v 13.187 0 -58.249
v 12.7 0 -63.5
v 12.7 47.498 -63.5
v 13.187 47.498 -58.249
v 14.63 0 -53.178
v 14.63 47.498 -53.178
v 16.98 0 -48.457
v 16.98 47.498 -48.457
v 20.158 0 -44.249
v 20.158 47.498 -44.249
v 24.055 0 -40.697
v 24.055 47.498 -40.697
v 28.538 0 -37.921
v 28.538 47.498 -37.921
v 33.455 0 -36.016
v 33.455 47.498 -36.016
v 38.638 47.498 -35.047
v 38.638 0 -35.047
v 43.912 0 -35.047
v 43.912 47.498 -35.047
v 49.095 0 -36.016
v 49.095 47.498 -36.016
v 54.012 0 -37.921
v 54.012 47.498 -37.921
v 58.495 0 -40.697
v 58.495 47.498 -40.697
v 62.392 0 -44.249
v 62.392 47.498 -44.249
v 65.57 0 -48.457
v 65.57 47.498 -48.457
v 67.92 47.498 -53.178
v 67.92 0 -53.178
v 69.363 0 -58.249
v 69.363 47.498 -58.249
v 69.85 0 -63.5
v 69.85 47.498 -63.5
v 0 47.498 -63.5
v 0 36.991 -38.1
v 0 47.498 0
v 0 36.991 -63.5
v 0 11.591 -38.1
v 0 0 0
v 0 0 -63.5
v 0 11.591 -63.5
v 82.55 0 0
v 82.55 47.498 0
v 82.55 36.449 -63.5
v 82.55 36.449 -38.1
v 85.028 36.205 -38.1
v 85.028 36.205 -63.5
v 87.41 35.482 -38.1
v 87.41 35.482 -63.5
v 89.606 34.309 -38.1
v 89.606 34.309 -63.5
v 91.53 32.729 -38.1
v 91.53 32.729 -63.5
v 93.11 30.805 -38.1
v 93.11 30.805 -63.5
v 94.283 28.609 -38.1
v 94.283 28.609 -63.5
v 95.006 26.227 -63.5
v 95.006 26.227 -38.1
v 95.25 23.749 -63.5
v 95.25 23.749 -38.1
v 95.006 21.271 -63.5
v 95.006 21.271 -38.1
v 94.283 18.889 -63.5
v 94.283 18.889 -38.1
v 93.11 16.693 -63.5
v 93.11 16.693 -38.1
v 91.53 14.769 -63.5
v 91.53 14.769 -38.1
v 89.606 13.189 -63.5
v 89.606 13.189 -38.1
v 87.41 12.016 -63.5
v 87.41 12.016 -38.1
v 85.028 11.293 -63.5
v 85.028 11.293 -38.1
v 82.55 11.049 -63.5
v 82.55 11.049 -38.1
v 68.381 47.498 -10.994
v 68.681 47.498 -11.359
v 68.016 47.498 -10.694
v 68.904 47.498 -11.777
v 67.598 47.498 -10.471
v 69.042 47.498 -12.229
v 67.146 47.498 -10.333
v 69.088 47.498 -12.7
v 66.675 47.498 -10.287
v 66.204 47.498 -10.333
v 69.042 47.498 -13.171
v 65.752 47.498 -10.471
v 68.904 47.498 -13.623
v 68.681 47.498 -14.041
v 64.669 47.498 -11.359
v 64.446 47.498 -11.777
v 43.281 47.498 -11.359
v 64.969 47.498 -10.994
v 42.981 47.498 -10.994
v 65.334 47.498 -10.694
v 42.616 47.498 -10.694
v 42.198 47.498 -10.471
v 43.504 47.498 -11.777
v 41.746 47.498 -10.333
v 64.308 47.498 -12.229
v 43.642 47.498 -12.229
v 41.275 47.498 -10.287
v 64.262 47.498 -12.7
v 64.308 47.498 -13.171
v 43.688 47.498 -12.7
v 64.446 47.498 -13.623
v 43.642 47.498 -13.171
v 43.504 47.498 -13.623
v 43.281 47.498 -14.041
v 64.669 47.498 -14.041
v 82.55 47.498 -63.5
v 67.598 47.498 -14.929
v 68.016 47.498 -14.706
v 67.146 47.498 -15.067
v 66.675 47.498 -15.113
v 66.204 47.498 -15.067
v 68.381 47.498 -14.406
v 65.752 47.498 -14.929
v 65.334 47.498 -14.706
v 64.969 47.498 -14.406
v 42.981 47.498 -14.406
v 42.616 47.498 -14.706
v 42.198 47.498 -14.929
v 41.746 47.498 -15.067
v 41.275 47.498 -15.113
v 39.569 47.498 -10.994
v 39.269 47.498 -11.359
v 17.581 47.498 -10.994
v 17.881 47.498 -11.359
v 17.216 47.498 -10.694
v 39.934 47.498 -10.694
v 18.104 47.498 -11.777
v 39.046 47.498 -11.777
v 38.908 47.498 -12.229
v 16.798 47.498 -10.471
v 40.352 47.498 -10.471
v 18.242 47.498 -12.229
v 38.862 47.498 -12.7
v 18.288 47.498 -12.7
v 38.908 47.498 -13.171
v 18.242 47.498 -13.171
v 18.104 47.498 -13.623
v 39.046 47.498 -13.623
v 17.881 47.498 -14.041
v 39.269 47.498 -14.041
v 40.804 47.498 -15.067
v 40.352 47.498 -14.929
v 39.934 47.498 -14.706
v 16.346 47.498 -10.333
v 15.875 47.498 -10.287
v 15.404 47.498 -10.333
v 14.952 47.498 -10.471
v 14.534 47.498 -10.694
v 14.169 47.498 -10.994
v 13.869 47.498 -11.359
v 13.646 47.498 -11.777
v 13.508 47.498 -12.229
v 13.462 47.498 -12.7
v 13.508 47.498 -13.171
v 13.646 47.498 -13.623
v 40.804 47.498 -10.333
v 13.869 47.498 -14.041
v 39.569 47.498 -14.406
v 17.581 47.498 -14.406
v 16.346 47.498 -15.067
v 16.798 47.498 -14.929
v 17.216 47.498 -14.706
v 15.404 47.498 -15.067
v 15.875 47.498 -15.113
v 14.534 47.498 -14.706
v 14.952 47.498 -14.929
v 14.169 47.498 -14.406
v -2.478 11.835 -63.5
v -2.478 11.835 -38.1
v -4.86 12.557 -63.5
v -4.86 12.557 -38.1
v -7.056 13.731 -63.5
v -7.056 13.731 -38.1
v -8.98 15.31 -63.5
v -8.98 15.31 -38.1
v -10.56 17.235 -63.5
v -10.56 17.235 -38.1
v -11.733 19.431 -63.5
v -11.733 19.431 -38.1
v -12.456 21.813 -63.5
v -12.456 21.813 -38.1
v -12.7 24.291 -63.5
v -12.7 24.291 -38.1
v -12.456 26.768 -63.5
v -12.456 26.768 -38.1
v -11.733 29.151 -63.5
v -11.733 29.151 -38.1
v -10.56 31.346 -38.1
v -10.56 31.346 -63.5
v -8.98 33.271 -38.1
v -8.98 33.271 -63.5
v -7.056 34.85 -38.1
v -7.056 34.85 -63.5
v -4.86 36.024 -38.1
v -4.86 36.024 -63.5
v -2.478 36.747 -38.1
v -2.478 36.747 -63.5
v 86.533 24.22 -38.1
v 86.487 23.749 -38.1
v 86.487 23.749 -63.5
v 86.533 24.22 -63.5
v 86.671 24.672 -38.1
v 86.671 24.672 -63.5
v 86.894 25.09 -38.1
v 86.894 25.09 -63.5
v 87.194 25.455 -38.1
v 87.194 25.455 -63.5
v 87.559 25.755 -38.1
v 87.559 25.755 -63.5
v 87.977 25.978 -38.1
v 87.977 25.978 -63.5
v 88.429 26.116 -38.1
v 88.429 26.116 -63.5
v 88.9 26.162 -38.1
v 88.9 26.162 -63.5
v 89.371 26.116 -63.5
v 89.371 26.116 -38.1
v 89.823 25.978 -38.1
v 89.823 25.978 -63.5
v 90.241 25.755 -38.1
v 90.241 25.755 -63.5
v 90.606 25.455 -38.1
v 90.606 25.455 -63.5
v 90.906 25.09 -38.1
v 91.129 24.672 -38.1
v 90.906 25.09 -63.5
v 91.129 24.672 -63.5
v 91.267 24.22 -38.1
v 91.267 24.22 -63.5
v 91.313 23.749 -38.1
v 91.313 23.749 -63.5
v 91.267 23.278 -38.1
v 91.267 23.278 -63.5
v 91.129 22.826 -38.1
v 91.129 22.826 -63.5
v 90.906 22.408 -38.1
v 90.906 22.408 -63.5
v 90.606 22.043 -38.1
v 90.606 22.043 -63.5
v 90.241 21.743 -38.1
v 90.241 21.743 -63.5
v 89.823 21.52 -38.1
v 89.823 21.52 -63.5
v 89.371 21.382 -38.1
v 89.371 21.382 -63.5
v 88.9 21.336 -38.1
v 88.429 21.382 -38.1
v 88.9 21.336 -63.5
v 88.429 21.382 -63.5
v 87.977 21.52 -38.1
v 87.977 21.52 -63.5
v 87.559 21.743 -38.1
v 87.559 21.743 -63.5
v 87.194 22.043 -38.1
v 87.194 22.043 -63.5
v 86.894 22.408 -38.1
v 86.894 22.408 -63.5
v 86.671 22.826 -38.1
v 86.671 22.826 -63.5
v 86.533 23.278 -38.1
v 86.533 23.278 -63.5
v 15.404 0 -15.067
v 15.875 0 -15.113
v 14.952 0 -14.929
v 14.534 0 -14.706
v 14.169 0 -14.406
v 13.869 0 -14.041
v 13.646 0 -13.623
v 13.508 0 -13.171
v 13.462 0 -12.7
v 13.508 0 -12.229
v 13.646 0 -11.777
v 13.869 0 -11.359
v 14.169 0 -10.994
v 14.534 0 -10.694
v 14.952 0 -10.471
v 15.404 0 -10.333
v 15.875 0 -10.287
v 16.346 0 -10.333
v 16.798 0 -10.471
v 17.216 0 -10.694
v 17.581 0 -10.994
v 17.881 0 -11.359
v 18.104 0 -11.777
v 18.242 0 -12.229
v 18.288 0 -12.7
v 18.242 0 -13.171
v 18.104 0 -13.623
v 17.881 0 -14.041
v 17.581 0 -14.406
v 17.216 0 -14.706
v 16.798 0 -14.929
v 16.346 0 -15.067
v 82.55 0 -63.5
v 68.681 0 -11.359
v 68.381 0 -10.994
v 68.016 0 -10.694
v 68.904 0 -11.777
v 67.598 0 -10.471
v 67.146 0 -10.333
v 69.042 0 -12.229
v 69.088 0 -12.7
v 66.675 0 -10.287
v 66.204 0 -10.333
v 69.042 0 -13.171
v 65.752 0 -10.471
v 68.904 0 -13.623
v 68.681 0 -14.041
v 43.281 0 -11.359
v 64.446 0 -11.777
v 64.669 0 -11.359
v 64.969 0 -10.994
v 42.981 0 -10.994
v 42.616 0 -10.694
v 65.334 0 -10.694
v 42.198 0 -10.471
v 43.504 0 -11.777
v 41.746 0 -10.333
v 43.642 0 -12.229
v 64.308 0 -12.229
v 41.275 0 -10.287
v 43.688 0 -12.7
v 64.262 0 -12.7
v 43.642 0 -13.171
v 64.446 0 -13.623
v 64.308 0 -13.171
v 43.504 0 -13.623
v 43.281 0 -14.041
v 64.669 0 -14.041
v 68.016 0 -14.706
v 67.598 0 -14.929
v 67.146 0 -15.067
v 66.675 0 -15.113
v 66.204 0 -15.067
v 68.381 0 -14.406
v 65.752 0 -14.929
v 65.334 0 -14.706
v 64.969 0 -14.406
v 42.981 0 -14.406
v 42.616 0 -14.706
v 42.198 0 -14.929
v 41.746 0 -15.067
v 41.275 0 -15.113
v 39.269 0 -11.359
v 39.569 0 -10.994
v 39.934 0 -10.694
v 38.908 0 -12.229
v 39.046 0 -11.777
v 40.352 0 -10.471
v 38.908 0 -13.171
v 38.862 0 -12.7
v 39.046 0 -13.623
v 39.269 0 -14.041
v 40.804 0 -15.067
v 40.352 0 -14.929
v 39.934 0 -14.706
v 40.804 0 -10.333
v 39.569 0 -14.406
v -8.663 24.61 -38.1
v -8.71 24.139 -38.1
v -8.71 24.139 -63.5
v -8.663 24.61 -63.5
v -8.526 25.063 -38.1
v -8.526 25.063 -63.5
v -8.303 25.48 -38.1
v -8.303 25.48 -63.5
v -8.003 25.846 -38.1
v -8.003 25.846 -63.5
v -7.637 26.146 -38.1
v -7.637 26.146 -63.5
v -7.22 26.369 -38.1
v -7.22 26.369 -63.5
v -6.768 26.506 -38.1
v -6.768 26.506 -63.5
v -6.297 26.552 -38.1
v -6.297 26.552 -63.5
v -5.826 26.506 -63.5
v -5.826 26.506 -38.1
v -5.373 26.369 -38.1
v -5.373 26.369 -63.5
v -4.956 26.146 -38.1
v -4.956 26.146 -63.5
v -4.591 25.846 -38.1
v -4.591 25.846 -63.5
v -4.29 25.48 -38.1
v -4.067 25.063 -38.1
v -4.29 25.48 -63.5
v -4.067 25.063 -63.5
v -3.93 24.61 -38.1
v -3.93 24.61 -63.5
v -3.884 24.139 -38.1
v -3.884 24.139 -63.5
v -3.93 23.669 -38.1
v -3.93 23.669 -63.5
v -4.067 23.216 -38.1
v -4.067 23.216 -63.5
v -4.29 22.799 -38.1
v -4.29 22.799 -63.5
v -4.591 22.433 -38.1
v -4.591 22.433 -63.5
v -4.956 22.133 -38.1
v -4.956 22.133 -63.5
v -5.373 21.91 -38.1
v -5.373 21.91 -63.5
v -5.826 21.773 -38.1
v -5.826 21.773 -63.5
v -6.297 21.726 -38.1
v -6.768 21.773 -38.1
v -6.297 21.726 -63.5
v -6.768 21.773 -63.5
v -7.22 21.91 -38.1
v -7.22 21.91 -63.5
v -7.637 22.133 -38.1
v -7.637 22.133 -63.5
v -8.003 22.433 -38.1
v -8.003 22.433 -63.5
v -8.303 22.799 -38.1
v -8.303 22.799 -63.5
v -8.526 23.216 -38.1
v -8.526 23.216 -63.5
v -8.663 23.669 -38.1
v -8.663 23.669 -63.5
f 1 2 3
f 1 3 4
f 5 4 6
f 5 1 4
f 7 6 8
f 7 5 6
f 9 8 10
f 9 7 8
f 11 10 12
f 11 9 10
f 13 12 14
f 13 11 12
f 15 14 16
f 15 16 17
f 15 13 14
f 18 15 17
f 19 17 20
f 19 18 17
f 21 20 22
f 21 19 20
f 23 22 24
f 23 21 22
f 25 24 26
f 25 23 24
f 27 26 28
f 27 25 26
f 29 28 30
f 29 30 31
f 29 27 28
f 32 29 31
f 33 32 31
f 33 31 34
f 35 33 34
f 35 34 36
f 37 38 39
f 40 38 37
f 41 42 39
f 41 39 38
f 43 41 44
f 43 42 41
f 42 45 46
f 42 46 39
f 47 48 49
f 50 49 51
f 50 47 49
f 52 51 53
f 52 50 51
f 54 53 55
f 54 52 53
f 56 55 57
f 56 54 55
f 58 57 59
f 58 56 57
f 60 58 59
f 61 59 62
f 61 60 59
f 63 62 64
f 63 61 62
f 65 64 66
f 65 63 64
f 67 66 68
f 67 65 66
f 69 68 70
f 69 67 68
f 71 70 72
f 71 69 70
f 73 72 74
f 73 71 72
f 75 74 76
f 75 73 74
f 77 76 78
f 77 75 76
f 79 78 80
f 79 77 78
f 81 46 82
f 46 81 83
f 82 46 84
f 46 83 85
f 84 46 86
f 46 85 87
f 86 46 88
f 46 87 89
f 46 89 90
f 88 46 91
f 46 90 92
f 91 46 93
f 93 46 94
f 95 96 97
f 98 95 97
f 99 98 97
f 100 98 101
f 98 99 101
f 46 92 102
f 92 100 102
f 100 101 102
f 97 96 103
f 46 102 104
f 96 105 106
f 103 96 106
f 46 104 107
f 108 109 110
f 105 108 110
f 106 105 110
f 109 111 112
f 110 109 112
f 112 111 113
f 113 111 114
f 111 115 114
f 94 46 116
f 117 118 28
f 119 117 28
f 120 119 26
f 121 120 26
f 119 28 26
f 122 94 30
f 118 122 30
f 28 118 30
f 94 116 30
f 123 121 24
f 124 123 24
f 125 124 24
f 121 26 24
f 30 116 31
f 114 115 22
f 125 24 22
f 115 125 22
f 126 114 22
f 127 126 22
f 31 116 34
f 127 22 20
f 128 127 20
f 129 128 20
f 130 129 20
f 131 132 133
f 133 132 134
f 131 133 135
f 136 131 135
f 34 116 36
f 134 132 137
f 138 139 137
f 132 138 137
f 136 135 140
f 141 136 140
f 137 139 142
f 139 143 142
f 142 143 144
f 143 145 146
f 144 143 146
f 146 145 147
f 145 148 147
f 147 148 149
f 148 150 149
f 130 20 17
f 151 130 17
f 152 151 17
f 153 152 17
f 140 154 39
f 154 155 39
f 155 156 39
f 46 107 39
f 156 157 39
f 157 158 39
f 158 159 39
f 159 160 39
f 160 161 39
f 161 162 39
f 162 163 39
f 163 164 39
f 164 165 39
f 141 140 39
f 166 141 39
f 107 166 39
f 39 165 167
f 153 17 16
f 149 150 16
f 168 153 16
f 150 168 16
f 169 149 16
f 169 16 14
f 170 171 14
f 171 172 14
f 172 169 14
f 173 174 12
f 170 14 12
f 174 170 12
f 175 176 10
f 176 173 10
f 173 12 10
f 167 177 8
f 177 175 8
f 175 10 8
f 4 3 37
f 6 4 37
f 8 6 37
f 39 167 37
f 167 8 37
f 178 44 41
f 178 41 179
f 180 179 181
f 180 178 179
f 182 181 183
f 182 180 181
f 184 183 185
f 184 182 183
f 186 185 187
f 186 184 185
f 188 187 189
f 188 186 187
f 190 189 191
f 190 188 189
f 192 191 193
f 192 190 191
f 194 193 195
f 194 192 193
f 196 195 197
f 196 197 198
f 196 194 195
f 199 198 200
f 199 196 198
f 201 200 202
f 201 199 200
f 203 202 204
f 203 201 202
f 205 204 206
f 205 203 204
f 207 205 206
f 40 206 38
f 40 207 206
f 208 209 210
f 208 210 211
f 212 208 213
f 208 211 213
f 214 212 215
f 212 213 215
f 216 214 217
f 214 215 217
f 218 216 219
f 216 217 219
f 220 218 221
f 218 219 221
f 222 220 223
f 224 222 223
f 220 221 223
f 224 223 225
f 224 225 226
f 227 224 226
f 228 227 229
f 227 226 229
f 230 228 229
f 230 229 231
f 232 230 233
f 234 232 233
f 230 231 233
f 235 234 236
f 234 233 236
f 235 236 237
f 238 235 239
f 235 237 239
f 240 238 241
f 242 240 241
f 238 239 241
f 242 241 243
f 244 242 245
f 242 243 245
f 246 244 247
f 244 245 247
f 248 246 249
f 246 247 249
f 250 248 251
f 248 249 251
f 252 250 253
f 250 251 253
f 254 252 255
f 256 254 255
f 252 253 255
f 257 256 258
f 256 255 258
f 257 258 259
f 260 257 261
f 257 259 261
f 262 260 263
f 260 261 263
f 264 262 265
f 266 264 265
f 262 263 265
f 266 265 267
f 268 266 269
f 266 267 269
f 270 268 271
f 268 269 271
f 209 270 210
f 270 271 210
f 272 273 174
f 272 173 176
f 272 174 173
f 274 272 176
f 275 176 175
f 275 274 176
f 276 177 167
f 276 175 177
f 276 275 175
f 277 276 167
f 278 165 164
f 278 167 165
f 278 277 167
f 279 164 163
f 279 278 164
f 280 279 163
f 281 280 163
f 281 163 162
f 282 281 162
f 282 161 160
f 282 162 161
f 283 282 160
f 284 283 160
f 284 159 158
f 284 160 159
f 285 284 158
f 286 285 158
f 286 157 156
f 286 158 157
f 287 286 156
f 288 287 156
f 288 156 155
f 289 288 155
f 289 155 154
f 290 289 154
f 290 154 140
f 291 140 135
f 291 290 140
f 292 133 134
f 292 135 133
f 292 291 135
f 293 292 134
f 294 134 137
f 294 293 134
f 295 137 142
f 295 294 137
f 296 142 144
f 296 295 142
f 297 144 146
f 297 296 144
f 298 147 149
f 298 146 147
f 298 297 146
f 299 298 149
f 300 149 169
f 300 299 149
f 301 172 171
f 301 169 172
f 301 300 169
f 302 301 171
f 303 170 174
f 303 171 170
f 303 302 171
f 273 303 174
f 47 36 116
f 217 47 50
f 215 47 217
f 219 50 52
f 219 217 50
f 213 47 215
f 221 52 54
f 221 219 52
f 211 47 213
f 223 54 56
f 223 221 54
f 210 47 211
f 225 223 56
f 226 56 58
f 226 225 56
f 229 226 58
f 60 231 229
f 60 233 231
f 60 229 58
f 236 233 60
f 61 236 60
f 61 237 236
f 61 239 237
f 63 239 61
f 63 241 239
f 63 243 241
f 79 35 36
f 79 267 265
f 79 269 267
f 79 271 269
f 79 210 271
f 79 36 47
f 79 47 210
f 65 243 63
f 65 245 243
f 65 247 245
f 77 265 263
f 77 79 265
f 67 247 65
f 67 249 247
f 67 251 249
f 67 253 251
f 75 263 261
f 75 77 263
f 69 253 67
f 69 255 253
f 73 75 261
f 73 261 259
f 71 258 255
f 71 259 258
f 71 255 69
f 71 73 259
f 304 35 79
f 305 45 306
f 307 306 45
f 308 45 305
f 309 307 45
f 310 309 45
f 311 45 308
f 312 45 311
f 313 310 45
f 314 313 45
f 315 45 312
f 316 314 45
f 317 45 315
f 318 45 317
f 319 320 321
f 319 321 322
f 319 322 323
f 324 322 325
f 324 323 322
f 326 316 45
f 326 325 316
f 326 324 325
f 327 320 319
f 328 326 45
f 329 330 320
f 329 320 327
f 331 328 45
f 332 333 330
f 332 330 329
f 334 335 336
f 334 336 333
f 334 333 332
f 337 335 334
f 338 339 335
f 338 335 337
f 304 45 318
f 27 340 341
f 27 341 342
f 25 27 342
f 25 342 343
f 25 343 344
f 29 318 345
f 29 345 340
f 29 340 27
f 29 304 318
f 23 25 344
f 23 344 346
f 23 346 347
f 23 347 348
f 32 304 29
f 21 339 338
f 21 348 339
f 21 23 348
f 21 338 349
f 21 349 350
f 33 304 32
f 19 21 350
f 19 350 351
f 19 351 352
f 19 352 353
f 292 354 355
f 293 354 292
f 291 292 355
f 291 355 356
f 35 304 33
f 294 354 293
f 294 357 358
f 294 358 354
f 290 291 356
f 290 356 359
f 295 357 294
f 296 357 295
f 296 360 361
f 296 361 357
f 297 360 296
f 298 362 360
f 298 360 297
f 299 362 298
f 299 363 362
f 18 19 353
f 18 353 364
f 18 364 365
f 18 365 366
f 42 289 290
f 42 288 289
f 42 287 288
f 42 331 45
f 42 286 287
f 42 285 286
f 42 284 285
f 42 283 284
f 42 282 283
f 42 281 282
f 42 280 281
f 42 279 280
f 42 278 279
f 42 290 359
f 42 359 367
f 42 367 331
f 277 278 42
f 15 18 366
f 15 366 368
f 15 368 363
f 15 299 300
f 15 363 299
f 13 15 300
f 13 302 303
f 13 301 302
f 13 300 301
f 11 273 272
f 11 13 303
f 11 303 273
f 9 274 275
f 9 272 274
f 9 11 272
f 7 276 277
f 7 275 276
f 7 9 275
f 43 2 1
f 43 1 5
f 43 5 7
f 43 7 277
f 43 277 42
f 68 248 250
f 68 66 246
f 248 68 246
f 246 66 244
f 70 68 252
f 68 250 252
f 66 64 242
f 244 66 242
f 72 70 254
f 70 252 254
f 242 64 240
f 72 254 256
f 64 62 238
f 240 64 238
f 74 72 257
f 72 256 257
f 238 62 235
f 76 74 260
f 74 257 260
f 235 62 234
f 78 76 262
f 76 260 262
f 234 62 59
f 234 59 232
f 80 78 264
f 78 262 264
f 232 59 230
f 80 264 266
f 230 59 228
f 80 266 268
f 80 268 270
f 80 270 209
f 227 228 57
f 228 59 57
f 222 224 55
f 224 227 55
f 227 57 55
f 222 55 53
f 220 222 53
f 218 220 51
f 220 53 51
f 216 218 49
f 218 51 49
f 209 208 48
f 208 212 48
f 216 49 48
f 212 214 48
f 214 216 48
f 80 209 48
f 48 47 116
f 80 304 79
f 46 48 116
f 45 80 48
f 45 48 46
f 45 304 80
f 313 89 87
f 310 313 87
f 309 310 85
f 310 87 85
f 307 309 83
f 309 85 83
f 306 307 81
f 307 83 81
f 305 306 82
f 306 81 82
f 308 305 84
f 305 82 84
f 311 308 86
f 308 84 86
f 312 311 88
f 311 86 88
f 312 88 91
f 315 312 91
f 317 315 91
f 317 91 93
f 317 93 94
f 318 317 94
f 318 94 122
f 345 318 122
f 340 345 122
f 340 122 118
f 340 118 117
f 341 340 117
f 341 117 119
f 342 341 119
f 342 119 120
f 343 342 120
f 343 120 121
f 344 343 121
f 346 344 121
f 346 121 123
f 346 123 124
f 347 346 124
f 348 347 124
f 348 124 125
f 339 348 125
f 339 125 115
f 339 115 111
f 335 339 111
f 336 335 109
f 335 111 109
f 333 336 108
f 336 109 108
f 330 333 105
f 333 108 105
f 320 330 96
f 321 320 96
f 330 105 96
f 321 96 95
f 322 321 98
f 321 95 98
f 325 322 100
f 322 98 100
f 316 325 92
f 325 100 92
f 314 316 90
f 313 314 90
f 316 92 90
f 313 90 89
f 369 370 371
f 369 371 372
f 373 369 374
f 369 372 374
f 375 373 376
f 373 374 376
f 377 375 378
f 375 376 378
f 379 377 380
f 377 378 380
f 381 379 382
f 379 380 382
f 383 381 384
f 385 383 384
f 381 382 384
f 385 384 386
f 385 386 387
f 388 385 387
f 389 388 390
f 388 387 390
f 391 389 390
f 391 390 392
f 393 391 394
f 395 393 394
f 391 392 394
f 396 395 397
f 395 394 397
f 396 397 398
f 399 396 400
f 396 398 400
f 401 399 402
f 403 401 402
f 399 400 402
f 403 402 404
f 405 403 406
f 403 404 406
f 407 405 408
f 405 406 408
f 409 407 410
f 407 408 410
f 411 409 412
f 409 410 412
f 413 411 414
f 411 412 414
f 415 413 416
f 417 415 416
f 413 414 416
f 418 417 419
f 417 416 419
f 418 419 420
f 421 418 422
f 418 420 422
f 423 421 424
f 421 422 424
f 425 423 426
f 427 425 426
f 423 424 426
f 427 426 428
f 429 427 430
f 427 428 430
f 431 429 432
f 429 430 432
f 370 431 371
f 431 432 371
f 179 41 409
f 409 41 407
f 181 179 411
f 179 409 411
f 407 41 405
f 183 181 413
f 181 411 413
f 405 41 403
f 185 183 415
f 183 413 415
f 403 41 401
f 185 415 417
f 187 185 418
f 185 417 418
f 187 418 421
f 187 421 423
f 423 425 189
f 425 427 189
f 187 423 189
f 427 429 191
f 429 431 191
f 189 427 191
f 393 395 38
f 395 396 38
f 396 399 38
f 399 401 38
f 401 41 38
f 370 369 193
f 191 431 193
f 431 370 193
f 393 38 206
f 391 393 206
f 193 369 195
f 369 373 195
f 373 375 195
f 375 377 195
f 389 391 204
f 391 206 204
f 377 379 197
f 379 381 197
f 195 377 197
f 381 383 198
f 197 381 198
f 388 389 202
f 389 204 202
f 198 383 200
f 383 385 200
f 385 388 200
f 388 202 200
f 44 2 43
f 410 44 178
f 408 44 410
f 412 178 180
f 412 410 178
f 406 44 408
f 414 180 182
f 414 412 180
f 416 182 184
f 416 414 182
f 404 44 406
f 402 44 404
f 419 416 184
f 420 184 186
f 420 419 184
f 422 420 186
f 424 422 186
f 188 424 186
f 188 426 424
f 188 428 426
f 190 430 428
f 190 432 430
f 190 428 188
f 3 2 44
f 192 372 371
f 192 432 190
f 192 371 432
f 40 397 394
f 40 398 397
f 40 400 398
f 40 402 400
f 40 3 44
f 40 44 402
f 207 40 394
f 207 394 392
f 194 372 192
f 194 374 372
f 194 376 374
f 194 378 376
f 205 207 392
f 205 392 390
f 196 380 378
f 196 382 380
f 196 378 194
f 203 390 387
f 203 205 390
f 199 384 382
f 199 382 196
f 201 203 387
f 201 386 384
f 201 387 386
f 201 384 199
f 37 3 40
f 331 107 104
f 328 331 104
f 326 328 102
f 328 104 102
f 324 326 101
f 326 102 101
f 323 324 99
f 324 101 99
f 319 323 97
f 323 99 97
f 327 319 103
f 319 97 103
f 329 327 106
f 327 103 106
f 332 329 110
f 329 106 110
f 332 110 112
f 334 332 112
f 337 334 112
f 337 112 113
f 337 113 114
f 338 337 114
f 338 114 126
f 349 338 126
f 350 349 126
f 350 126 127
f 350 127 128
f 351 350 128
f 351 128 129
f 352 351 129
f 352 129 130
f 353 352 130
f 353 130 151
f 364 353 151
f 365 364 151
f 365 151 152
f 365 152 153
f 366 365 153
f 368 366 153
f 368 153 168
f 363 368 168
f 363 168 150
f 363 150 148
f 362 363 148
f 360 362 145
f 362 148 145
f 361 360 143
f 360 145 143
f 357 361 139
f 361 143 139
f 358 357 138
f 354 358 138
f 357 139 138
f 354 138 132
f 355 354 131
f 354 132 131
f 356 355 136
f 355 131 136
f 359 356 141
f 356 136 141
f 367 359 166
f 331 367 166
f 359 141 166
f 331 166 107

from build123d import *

# Parameters (mm, degrees)
BOSS_EXTRUDE1_DEPTH     = 47.498
CUT_EXTRUDE3_DEPTH      = 115.467517244
CUT_EXTRUDE3_DEPTH_BACK = 115.467517244
SKETCH2_R               = 2.413
SKETCH2_4_R             = 2.413
CUT_EXTRUDE4_DEPTH      = 115.467517244
SKETCH6_R               = 12.7
BOSS_EXTRUDE5_DEPTH     = 25.4
SKETCH6_6_R             = 12.7
BOSS_EXTRUDE6_DEPTH     = 25.4
SKETCH8_R               = 2.413
CUT_EXTRUDE5_DEPTH      = 25.4
SKETCH9_R               = 2.413
CUT_EXTRUDE6_DEPTH      = 25.4


with BuildPart() as part:
    # Sketch1 → Boss-Extrude1 (new body)
    with BuildSketch(Plane(origin=(0, 0, 0), x_dir=(1, 0, 0), z_dir=(0, 1, 0))):
        with BuildLine():
            Line((0, 0), (0, 63.5))
            Line((0, 63.5), (12.7, 63.5))
            ThreePointArc((12.7, 63.5), (41.275, 34.925), (69.85, 63.5))
            Line((69.85, 63.5), (82.55, 63.5))
            Line((82.55, 63.5), (82.55, 0))
            Line((82.55, 0), (0, 0))
        make_face()
    extrude(amount=BOSS_EXTRUDE1_DEPTH)

    # Sketch2 → Cut-Extrude3 (cut, two sides: drawn at the far end of the back side and taken through both)
    with BuildSketch(Plane(origin=(0, 47.498, 0), x_dir=(1, 0, 0), z_dir=(0, 1, 0)).offset(-CUT_EXTRUDE3_DEPTH_BACK)):
        with Locations((15.875, 12.7)):
            Circle(SKETCH2_R)
    extrude(amount=CUT_EXTRUDE3_DEPTH + CUT_EXTRUDE3_DEPTH_BACK, mode=Mode.SUBTRACT)

    # Sketch2<4> → Cut-Extrude4 (cut, through all)
    with BuildSketch(Plane(origin=(0, 47.498, 0), x_dir=(1, 0, 0), z_dir=(0, 1, 0))):
        with Locations((15.875, 12.7)):
            Circle(SKETCH2_4_R)
        with Locations((41.275, 12.7)):
            Circle(SKETCH2_4_R)
        with Locations((66.675, 12.7)):
            Circle(SKETCH2_4_R)
    extrude(amount=-CUT_EXTRUDE4_DEPTH, mode=Mode.SUBTRACT)

    # Sketch6 → Boss-Extrude5 (add)
    with BuildSketch(Plane(origin=(0, 0, -63.5), x_dir=(-1, 0, 0), z_dir=(0, 0, -1))):
        with Locations((-82.55, 23.749)):
            Circle(SKETCH6_R)
    extrude(amount=-BOSS_EXTRUDE5_DEPTH)

    # Sketch6<6> → Boss-Extrude6 (add)
    with BuildSketch(Plane(origin=(0, 0, -63.5), x_dir=(-1, 0, 0), z_dir=(0, 0, -1))):
        with Locations((0, 24.290625464)):
            Circle(SKETCH6_6_R)
        with Locations((-82.55, 23.749)):
            Circle(SKETCH6_6_R)
    extrude(amount=-BOSS_EXTRUDE6_DEPTH)

    # Sketch8 → Cut-Extrude5 (cut)
    with BuildSketch(Plane(origin=(0, 0, -63.5), x_dir=(-1, 0, 0), z_dir=(0, 0, -1))):
        with Locations((-88.9, 23.749)):
            Circle(SKETCH8_R)
    extrude(amount=-CUT_EXTRUDE5_DEPTH, mode=Mode.SUBTRACT)

    # Sketch9 → Cut-Extrude6 (cut)
    with BuildSketch(Plane(origin=(0, 0, -63.5), x_dir=(-1, 0, 0), z_dir=(0, 0, -1))):
        with Locations((6.296749676, 24.139451287)):
            Circle(SKETCH9_R)
    extrude(amount=-CUT_EXTRUDE6_DEPTH, mode=Mode.SUBTRACT)


solid = part.part
